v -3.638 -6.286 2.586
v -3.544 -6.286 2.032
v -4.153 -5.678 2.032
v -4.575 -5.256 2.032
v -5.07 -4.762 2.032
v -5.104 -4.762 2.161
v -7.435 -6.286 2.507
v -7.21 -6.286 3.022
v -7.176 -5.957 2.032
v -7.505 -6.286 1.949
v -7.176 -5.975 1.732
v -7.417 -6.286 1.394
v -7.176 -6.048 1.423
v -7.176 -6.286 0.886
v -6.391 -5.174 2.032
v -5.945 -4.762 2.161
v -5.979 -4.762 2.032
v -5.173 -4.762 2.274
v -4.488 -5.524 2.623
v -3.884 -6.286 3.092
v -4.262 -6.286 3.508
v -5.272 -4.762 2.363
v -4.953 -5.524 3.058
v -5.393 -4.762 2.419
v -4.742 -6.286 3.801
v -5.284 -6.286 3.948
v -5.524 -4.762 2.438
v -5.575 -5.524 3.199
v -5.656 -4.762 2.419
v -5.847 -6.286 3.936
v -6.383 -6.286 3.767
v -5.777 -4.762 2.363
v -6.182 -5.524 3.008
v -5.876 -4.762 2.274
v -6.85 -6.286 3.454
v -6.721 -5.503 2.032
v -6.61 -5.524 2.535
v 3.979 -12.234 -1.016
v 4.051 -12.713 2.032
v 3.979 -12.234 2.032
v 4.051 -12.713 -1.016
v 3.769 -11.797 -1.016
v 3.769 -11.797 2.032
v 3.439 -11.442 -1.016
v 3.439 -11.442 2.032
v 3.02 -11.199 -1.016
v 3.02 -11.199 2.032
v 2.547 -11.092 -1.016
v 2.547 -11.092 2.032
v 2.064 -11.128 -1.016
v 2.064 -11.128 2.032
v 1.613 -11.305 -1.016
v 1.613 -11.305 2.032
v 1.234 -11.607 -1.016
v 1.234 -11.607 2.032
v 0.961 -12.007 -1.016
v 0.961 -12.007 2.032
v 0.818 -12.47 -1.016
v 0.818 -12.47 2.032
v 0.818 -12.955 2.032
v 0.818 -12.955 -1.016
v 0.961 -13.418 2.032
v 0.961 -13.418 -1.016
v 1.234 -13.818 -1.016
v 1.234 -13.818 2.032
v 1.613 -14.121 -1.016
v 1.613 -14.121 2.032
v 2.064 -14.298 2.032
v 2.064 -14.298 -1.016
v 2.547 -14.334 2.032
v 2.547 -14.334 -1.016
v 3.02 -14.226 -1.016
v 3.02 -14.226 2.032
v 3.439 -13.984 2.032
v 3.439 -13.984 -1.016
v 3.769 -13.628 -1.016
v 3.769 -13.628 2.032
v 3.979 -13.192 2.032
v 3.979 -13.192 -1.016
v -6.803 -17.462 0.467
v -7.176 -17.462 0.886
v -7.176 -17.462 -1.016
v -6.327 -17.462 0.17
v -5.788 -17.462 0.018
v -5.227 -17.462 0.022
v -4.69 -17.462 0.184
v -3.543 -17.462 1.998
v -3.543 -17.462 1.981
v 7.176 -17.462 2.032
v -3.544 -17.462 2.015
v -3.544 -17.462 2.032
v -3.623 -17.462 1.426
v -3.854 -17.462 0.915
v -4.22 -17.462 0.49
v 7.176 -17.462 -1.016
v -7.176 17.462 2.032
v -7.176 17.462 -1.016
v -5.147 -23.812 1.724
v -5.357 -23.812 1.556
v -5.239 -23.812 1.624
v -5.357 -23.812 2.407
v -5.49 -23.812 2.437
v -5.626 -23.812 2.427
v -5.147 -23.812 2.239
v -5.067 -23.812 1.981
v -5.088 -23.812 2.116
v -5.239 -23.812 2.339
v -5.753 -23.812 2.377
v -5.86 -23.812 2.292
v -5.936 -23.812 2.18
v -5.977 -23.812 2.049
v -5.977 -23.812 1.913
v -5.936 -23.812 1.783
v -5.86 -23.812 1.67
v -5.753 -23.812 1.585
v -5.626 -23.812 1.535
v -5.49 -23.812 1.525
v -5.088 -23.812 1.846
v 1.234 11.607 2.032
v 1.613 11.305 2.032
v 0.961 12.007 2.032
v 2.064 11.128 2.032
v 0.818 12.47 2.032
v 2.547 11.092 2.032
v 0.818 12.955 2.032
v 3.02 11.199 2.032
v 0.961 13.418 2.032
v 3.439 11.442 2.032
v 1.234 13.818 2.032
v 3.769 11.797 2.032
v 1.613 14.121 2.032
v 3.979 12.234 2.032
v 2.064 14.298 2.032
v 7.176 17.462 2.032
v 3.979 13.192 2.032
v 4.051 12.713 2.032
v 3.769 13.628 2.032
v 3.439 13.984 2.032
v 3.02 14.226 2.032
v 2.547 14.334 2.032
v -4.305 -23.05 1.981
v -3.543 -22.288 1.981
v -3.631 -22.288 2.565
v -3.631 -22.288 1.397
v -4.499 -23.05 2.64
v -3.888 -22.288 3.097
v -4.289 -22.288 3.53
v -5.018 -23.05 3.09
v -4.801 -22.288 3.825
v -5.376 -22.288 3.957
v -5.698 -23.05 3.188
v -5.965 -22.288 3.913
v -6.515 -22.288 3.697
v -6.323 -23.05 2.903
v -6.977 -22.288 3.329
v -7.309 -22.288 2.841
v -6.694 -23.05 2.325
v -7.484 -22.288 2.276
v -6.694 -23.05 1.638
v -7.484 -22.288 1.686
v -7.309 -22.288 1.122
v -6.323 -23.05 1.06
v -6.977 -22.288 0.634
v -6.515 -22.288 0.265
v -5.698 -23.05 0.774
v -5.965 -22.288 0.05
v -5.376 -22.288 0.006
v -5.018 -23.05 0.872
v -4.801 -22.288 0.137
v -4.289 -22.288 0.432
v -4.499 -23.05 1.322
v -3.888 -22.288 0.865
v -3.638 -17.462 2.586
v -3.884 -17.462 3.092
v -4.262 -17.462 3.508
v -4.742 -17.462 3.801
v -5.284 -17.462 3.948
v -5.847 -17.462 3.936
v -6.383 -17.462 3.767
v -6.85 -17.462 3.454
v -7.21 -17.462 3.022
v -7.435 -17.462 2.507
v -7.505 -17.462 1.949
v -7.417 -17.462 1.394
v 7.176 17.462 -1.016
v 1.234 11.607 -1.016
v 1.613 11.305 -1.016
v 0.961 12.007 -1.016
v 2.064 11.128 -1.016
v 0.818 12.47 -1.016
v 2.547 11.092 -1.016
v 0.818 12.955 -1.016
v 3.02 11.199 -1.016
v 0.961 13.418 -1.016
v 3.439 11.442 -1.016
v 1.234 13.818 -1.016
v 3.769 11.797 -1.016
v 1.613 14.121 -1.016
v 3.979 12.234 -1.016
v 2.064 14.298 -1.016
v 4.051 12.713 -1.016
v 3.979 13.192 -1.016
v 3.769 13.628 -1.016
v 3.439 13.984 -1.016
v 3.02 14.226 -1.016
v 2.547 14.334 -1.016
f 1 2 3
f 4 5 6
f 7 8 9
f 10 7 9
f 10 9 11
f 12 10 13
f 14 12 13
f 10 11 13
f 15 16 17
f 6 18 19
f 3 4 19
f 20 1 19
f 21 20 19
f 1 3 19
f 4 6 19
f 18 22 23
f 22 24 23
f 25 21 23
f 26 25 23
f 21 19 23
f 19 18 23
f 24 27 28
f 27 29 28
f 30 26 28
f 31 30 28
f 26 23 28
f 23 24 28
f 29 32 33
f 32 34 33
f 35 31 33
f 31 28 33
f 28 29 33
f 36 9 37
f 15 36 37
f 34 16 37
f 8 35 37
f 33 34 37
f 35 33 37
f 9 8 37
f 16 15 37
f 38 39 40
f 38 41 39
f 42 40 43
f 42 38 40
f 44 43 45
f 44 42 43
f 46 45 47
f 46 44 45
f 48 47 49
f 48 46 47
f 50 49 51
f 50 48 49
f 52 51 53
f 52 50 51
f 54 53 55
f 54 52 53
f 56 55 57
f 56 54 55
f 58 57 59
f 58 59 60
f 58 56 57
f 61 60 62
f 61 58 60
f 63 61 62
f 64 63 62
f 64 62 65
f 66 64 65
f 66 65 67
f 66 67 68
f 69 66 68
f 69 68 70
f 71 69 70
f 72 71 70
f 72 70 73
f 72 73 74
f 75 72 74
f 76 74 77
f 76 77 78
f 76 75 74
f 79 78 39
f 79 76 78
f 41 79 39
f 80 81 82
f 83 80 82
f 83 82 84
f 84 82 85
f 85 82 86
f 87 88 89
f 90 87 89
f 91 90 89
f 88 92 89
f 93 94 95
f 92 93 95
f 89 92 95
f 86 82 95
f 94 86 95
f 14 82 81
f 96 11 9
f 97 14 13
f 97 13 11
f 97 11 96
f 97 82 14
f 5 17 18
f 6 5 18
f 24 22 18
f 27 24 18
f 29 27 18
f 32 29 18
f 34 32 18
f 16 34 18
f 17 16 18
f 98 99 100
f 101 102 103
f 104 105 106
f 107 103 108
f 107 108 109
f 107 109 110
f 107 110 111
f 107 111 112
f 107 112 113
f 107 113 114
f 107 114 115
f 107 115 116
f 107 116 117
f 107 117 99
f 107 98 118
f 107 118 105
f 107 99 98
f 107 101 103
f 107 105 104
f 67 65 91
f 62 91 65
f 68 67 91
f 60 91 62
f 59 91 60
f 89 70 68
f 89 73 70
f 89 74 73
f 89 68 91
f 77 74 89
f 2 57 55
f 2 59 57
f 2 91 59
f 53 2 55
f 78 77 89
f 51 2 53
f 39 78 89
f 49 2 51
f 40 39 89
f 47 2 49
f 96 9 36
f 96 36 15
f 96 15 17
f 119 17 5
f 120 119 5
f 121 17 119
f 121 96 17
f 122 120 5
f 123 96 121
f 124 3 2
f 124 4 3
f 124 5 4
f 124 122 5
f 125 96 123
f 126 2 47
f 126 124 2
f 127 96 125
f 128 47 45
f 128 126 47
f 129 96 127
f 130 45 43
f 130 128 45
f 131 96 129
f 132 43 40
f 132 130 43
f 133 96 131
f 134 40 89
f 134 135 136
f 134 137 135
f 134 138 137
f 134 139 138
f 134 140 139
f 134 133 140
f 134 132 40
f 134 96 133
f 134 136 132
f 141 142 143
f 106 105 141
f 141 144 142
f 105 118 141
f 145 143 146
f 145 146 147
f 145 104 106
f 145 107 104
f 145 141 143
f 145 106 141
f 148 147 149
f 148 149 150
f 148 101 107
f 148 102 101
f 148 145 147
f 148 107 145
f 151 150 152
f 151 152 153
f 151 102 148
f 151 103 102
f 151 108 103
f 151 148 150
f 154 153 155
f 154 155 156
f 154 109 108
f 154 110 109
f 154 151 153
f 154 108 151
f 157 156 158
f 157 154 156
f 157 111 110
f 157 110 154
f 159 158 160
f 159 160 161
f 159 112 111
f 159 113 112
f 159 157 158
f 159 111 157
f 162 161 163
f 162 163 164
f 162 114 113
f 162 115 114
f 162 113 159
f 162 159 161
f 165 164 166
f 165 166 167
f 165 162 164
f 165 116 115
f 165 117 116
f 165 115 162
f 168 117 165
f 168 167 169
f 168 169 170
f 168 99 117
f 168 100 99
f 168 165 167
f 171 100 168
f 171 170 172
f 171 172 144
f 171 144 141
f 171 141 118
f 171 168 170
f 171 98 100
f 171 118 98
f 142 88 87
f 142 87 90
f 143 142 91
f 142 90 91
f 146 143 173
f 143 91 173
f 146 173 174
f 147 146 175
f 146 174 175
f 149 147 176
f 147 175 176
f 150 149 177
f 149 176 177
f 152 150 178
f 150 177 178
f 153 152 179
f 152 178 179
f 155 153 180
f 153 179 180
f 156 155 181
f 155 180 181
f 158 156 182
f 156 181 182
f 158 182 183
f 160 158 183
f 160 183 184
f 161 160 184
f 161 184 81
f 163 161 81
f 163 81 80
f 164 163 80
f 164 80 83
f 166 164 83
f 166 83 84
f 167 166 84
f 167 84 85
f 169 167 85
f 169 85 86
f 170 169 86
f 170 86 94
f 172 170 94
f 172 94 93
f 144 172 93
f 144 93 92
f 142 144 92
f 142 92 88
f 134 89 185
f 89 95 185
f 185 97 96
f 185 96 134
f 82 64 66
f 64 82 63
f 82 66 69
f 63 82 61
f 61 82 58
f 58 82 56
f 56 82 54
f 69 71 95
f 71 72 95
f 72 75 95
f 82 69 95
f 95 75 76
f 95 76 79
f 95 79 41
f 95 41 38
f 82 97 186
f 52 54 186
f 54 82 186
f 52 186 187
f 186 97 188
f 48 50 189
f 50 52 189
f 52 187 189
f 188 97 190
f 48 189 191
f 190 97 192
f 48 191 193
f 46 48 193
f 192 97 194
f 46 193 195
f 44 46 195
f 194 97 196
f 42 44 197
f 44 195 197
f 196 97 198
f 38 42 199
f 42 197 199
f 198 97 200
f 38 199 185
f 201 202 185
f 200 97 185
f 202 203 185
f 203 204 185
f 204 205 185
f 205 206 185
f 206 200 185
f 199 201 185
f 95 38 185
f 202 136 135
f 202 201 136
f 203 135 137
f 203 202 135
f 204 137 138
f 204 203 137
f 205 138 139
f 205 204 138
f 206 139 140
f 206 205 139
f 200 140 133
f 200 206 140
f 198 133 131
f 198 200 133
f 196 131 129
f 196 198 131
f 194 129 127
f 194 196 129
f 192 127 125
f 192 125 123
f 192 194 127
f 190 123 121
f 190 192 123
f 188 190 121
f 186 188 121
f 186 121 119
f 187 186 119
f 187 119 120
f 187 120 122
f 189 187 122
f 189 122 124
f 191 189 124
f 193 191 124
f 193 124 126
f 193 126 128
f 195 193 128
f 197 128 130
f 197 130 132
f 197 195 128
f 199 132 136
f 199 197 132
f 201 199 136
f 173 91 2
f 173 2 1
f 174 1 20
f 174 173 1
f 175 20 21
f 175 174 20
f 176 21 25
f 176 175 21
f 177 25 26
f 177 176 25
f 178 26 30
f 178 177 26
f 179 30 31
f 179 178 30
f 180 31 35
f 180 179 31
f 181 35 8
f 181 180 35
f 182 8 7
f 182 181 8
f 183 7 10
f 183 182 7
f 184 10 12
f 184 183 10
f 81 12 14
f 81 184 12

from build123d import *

# Parameters (mm, degrees)
F0_W          = 14.351
F0_H          = 34.925
F0_R          = 1.6256
F1_DEPTH      = 1.016
F1_DEPTH_BACK = 2.032
F2_R          = 1.9812
F3_DEPTH      = 6.35
F3_DEPTH_BACK = 12.7
F4_SIZE       = 1.524


with BuildPart() as f1:
    # F0 (on Top) → F1 (new body, two sides)
    with BuildSketch(Plane.XY) as f1_sk:
        Rectangle(F0_W, F0_H)
        with Locations((2.4257, -12.7127)):
            Circle(F0_R, mode=Mode.SUBTRACT)
        with Locations((2.4257, 12.7127)):
            Circle(F0_R, mode=Mode.SUBTRACT)
    extrude(amount=-F1_DEPTH)
    extrude(f1_sk.sketch, amount=F1_DEPTH_BACK)

    # F2 (on face) → F3 (join, two sides)
    with BuildSketch(Plane.XZ.offset(17.4625)) as f3_sk:
        with Locations((-5.5245, 1.9812)):
            Circle(F2_R)
    extrude(amount=F3_DEPTH)
    extrude(f3_sk.sketch, amount=-F3_DEPTH_BACK)

    # F4
    f4_edges = [f1.edges().sort_by_distance(p)[0] for p in [
        (-7.5057, -23.8125, 1.9812),
        (-6.120697, -4.7625, 3.870566),
    ]]
    chamfer(f4_edges, length=F4_SIZE)


solid = f1.part
